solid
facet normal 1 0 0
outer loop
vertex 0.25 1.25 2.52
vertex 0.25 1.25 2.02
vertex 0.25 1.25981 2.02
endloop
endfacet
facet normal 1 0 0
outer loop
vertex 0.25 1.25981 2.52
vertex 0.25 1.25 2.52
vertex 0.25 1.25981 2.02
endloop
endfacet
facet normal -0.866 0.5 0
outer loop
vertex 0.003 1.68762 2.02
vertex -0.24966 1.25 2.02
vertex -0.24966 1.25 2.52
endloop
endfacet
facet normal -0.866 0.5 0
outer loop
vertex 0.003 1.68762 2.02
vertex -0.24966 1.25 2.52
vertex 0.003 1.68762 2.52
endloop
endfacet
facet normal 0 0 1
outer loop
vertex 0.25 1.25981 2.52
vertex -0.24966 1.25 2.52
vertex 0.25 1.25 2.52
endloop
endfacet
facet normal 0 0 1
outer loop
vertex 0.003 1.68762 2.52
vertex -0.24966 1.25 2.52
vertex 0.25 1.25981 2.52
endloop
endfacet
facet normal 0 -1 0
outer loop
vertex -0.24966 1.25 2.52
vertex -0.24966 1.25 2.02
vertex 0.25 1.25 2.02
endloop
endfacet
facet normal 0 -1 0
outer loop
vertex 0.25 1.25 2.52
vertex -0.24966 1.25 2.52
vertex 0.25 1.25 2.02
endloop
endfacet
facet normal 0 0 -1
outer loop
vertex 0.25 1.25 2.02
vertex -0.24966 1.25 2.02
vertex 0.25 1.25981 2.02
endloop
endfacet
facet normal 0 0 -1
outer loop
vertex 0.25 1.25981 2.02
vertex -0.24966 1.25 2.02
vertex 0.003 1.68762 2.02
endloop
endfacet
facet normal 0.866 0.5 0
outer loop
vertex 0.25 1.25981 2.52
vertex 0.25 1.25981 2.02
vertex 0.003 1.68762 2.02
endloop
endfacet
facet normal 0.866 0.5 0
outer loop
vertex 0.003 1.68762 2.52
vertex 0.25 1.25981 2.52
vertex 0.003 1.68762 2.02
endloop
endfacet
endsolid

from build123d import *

# Parameters (mm, degrees)
BOX010_W               = 1
BOX010_H               = 1
BOX010_DEPTH           = 0.5
BOX010_PLACEMENT_ANGLE = 30
BOX011_W               = 1
BOX011_H               = 1
BOX011_DEPTH           = 0.5
BOX011_PLACEMENT_ANGLE = 60
BOX009_W               = 0.5
BOX009_H               = 0.5
BOX009_DEPTH           = 0.5


with BuildPart() as kub010:
    # Box010 → Box010 (new body)
    with BuildSketch(Plane.XY):
        with Locations((0.5, 0.5)):
            Rectangle(BOX010_W, BOX010_H)
    extrude(amount=BOX010_DEPTH)


with BuildPart() as kub010_1:
    # Box010 placement: moved
    add(kub010.part.moved(Location((0.4, 1, 2.02))).rotate(Axis((0.4, 1, 2.02), (0, 0, 1)), BOX010_PLACEMENT_ANGLE))


with BuildPart() as kub011:
    # Box011 → Box011 (new body)
    with BuildSketch(Plane.XY):
        with Locations((0.5, 0.5)):
            Rectangle(BOX011_W, BOX011_H)
    extrude(amount=BOX011_DEPTH)


with BuildPart() as kub011_1:
    # Box011 placement: moved
    add(kub011.part.moved(Location((-0.394, 1, 2.02))).rotate(Axis((-0.394, 1, 2.02), (0, 0, 1)), BOX011_PLACEMENT_ANGLE))


with BuildPart() as cut018:
    # Box009 → Box009 (new body)
    with BuildSketch(Plane(origin=(-0.25, 1.25, 2.02), x_dir=(1, 0, 0), z_dir=(0, 0, 1))):
        with Locations((0.25, 0.25)):
            Rectangle(BOX009_W, BOX009_H)
    extrude(amount=BOX009_DEPTH)

    # Cut017: cut Kub011
    add(kub011_1.part, mode=Mode.SUBTRACT)

    # Cut018: cut Kub010
    add(kub010_1.part, mode=Mode.SUBTRACT)


solid = cut018.part
